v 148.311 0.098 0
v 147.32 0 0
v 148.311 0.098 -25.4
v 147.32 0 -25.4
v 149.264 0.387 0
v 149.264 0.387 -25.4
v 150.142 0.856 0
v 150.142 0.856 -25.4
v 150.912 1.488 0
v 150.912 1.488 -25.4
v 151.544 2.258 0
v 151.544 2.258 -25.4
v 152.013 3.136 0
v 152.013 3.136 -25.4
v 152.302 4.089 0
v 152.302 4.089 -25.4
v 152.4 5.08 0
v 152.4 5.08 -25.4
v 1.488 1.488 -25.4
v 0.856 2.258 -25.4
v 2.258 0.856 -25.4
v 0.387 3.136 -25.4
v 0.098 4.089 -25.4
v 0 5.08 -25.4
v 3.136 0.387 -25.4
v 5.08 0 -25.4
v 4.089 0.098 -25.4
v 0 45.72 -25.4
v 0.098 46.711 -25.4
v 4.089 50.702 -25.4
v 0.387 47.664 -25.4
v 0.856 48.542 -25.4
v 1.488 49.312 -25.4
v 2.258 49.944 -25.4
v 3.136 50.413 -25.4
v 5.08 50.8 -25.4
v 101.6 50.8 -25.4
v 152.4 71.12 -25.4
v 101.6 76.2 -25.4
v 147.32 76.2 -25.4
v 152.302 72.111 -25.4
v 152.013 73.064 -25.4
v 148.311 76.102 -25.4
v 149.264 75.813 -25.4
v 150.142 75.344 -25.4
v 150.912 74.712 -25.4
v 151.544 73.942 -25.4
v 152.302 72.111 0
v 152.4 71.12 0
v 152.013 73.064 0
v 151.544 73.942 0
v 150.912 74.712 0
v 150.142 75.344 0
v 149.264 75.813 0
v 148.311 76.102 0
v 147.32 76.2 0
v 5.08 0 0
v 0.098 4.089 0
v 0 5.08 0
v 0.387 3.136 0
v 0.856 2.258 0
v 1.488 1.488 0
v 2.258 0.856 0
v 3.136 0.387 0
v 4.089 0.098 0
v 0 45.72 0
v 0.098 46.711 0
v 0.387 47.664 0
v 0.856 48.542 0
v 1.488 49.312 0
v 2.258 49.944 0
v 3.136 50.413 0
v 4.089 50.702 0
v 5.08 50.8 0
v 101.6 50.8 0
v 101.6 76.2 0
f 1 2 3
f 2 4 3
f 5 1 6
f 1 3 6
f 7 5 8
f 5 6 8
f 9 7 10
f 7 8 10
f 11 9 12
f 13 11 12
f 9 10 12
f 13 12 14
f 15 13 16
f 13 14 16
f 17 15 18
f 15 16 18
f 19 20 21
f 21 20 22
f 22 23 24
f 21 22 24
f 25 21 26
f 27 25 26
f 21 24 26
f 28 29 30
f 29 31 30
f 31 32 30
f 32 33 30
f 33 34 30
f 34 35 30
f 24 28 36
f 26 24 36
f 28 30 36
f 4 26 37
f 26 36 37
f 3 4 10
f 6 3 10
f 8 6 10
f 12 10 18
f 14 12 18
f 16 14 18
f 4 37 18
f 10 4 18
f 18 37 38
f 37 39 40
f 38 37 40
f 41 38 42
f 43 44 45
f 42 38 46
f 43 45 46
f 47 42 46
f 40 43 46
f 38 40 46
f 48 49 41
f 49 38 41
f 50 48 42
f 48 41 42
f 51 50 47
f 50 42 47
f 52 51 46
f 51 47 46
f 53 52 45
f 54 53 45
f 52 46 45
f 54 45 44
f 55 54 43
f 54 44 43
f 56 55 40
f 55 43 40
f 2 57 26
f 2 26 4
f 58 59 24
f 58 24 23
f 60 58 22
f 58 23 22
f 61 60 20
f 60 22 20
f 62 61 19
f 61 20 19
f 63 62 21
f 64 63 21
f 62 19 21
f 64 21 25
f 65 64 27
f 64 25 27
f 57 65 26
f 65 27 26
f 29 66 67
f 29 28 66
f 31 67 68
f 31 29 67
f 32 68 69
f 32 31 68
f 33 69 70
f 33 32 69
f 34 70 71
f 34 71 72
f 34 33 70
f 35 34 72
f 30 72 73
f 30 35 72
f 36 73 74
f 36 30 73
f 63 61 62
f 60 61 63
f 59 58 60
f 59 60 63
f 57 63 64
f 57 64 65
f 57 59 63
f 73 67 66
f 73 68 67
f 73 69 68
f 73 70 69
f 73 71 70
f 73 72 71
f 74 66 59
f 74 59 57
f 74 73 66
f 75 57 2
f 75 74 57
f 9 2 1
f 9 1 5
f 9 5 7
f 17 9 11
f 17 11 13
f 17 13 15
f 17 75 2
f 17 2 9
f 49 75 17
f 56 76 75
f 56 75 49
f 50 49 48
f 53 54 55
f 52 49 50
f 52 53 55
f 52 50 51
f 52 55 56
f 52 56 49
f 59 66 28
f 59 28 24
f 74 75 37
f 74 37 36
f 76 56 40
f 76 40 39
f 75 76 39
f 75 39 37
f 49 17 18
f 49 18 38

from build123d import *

# Parameters (mm, degrees)
F1_DEPTH = 25.4
F2_R     = 5.08
F3_R     = 5.08
F4_R     = 5.08
F5_R     = 5.08


with BuildPart() as f1:
    # F0 (on Top) → F1 (new body)
    with BuildSketch(Plane.XY):
        Polygon((0, 50.8), (0, 0), (152.4, 0), (152.4, 76.2), (101.6, 76.2), (101.6, 50.8), align=None)
    extrude(amount=-F1_DEPTH)

    # F2
    f2_edges = [f1.edges().sort_by_distance(p)[0] for p in [
        (152.4, 76.2, -12.7),
    ]]
    fillet(f2_edges, radius=F2_R)

    # F3
    f3_edges = [f1.edges().sort_by_distance(p)[0] for p in [
        (0, 50.8, -12.7),
    ]]
    fillet(f3_edges, radius=F3_R)

    # F4
    f4_edges = [f1.edges().sort_by_distance(p)[0] for p in [
        (0, 0, -12.7),
    ]]
    fillet(f4_edges, radius=F4_R)

    # F5
    f5_edges = [f1.edges().sort_by_distance(p)[0] for p in [
        (152.4, 0, -12.7),
    ]]
    fillet(f5_edges, radius=F5_R)


solid = f1.part
